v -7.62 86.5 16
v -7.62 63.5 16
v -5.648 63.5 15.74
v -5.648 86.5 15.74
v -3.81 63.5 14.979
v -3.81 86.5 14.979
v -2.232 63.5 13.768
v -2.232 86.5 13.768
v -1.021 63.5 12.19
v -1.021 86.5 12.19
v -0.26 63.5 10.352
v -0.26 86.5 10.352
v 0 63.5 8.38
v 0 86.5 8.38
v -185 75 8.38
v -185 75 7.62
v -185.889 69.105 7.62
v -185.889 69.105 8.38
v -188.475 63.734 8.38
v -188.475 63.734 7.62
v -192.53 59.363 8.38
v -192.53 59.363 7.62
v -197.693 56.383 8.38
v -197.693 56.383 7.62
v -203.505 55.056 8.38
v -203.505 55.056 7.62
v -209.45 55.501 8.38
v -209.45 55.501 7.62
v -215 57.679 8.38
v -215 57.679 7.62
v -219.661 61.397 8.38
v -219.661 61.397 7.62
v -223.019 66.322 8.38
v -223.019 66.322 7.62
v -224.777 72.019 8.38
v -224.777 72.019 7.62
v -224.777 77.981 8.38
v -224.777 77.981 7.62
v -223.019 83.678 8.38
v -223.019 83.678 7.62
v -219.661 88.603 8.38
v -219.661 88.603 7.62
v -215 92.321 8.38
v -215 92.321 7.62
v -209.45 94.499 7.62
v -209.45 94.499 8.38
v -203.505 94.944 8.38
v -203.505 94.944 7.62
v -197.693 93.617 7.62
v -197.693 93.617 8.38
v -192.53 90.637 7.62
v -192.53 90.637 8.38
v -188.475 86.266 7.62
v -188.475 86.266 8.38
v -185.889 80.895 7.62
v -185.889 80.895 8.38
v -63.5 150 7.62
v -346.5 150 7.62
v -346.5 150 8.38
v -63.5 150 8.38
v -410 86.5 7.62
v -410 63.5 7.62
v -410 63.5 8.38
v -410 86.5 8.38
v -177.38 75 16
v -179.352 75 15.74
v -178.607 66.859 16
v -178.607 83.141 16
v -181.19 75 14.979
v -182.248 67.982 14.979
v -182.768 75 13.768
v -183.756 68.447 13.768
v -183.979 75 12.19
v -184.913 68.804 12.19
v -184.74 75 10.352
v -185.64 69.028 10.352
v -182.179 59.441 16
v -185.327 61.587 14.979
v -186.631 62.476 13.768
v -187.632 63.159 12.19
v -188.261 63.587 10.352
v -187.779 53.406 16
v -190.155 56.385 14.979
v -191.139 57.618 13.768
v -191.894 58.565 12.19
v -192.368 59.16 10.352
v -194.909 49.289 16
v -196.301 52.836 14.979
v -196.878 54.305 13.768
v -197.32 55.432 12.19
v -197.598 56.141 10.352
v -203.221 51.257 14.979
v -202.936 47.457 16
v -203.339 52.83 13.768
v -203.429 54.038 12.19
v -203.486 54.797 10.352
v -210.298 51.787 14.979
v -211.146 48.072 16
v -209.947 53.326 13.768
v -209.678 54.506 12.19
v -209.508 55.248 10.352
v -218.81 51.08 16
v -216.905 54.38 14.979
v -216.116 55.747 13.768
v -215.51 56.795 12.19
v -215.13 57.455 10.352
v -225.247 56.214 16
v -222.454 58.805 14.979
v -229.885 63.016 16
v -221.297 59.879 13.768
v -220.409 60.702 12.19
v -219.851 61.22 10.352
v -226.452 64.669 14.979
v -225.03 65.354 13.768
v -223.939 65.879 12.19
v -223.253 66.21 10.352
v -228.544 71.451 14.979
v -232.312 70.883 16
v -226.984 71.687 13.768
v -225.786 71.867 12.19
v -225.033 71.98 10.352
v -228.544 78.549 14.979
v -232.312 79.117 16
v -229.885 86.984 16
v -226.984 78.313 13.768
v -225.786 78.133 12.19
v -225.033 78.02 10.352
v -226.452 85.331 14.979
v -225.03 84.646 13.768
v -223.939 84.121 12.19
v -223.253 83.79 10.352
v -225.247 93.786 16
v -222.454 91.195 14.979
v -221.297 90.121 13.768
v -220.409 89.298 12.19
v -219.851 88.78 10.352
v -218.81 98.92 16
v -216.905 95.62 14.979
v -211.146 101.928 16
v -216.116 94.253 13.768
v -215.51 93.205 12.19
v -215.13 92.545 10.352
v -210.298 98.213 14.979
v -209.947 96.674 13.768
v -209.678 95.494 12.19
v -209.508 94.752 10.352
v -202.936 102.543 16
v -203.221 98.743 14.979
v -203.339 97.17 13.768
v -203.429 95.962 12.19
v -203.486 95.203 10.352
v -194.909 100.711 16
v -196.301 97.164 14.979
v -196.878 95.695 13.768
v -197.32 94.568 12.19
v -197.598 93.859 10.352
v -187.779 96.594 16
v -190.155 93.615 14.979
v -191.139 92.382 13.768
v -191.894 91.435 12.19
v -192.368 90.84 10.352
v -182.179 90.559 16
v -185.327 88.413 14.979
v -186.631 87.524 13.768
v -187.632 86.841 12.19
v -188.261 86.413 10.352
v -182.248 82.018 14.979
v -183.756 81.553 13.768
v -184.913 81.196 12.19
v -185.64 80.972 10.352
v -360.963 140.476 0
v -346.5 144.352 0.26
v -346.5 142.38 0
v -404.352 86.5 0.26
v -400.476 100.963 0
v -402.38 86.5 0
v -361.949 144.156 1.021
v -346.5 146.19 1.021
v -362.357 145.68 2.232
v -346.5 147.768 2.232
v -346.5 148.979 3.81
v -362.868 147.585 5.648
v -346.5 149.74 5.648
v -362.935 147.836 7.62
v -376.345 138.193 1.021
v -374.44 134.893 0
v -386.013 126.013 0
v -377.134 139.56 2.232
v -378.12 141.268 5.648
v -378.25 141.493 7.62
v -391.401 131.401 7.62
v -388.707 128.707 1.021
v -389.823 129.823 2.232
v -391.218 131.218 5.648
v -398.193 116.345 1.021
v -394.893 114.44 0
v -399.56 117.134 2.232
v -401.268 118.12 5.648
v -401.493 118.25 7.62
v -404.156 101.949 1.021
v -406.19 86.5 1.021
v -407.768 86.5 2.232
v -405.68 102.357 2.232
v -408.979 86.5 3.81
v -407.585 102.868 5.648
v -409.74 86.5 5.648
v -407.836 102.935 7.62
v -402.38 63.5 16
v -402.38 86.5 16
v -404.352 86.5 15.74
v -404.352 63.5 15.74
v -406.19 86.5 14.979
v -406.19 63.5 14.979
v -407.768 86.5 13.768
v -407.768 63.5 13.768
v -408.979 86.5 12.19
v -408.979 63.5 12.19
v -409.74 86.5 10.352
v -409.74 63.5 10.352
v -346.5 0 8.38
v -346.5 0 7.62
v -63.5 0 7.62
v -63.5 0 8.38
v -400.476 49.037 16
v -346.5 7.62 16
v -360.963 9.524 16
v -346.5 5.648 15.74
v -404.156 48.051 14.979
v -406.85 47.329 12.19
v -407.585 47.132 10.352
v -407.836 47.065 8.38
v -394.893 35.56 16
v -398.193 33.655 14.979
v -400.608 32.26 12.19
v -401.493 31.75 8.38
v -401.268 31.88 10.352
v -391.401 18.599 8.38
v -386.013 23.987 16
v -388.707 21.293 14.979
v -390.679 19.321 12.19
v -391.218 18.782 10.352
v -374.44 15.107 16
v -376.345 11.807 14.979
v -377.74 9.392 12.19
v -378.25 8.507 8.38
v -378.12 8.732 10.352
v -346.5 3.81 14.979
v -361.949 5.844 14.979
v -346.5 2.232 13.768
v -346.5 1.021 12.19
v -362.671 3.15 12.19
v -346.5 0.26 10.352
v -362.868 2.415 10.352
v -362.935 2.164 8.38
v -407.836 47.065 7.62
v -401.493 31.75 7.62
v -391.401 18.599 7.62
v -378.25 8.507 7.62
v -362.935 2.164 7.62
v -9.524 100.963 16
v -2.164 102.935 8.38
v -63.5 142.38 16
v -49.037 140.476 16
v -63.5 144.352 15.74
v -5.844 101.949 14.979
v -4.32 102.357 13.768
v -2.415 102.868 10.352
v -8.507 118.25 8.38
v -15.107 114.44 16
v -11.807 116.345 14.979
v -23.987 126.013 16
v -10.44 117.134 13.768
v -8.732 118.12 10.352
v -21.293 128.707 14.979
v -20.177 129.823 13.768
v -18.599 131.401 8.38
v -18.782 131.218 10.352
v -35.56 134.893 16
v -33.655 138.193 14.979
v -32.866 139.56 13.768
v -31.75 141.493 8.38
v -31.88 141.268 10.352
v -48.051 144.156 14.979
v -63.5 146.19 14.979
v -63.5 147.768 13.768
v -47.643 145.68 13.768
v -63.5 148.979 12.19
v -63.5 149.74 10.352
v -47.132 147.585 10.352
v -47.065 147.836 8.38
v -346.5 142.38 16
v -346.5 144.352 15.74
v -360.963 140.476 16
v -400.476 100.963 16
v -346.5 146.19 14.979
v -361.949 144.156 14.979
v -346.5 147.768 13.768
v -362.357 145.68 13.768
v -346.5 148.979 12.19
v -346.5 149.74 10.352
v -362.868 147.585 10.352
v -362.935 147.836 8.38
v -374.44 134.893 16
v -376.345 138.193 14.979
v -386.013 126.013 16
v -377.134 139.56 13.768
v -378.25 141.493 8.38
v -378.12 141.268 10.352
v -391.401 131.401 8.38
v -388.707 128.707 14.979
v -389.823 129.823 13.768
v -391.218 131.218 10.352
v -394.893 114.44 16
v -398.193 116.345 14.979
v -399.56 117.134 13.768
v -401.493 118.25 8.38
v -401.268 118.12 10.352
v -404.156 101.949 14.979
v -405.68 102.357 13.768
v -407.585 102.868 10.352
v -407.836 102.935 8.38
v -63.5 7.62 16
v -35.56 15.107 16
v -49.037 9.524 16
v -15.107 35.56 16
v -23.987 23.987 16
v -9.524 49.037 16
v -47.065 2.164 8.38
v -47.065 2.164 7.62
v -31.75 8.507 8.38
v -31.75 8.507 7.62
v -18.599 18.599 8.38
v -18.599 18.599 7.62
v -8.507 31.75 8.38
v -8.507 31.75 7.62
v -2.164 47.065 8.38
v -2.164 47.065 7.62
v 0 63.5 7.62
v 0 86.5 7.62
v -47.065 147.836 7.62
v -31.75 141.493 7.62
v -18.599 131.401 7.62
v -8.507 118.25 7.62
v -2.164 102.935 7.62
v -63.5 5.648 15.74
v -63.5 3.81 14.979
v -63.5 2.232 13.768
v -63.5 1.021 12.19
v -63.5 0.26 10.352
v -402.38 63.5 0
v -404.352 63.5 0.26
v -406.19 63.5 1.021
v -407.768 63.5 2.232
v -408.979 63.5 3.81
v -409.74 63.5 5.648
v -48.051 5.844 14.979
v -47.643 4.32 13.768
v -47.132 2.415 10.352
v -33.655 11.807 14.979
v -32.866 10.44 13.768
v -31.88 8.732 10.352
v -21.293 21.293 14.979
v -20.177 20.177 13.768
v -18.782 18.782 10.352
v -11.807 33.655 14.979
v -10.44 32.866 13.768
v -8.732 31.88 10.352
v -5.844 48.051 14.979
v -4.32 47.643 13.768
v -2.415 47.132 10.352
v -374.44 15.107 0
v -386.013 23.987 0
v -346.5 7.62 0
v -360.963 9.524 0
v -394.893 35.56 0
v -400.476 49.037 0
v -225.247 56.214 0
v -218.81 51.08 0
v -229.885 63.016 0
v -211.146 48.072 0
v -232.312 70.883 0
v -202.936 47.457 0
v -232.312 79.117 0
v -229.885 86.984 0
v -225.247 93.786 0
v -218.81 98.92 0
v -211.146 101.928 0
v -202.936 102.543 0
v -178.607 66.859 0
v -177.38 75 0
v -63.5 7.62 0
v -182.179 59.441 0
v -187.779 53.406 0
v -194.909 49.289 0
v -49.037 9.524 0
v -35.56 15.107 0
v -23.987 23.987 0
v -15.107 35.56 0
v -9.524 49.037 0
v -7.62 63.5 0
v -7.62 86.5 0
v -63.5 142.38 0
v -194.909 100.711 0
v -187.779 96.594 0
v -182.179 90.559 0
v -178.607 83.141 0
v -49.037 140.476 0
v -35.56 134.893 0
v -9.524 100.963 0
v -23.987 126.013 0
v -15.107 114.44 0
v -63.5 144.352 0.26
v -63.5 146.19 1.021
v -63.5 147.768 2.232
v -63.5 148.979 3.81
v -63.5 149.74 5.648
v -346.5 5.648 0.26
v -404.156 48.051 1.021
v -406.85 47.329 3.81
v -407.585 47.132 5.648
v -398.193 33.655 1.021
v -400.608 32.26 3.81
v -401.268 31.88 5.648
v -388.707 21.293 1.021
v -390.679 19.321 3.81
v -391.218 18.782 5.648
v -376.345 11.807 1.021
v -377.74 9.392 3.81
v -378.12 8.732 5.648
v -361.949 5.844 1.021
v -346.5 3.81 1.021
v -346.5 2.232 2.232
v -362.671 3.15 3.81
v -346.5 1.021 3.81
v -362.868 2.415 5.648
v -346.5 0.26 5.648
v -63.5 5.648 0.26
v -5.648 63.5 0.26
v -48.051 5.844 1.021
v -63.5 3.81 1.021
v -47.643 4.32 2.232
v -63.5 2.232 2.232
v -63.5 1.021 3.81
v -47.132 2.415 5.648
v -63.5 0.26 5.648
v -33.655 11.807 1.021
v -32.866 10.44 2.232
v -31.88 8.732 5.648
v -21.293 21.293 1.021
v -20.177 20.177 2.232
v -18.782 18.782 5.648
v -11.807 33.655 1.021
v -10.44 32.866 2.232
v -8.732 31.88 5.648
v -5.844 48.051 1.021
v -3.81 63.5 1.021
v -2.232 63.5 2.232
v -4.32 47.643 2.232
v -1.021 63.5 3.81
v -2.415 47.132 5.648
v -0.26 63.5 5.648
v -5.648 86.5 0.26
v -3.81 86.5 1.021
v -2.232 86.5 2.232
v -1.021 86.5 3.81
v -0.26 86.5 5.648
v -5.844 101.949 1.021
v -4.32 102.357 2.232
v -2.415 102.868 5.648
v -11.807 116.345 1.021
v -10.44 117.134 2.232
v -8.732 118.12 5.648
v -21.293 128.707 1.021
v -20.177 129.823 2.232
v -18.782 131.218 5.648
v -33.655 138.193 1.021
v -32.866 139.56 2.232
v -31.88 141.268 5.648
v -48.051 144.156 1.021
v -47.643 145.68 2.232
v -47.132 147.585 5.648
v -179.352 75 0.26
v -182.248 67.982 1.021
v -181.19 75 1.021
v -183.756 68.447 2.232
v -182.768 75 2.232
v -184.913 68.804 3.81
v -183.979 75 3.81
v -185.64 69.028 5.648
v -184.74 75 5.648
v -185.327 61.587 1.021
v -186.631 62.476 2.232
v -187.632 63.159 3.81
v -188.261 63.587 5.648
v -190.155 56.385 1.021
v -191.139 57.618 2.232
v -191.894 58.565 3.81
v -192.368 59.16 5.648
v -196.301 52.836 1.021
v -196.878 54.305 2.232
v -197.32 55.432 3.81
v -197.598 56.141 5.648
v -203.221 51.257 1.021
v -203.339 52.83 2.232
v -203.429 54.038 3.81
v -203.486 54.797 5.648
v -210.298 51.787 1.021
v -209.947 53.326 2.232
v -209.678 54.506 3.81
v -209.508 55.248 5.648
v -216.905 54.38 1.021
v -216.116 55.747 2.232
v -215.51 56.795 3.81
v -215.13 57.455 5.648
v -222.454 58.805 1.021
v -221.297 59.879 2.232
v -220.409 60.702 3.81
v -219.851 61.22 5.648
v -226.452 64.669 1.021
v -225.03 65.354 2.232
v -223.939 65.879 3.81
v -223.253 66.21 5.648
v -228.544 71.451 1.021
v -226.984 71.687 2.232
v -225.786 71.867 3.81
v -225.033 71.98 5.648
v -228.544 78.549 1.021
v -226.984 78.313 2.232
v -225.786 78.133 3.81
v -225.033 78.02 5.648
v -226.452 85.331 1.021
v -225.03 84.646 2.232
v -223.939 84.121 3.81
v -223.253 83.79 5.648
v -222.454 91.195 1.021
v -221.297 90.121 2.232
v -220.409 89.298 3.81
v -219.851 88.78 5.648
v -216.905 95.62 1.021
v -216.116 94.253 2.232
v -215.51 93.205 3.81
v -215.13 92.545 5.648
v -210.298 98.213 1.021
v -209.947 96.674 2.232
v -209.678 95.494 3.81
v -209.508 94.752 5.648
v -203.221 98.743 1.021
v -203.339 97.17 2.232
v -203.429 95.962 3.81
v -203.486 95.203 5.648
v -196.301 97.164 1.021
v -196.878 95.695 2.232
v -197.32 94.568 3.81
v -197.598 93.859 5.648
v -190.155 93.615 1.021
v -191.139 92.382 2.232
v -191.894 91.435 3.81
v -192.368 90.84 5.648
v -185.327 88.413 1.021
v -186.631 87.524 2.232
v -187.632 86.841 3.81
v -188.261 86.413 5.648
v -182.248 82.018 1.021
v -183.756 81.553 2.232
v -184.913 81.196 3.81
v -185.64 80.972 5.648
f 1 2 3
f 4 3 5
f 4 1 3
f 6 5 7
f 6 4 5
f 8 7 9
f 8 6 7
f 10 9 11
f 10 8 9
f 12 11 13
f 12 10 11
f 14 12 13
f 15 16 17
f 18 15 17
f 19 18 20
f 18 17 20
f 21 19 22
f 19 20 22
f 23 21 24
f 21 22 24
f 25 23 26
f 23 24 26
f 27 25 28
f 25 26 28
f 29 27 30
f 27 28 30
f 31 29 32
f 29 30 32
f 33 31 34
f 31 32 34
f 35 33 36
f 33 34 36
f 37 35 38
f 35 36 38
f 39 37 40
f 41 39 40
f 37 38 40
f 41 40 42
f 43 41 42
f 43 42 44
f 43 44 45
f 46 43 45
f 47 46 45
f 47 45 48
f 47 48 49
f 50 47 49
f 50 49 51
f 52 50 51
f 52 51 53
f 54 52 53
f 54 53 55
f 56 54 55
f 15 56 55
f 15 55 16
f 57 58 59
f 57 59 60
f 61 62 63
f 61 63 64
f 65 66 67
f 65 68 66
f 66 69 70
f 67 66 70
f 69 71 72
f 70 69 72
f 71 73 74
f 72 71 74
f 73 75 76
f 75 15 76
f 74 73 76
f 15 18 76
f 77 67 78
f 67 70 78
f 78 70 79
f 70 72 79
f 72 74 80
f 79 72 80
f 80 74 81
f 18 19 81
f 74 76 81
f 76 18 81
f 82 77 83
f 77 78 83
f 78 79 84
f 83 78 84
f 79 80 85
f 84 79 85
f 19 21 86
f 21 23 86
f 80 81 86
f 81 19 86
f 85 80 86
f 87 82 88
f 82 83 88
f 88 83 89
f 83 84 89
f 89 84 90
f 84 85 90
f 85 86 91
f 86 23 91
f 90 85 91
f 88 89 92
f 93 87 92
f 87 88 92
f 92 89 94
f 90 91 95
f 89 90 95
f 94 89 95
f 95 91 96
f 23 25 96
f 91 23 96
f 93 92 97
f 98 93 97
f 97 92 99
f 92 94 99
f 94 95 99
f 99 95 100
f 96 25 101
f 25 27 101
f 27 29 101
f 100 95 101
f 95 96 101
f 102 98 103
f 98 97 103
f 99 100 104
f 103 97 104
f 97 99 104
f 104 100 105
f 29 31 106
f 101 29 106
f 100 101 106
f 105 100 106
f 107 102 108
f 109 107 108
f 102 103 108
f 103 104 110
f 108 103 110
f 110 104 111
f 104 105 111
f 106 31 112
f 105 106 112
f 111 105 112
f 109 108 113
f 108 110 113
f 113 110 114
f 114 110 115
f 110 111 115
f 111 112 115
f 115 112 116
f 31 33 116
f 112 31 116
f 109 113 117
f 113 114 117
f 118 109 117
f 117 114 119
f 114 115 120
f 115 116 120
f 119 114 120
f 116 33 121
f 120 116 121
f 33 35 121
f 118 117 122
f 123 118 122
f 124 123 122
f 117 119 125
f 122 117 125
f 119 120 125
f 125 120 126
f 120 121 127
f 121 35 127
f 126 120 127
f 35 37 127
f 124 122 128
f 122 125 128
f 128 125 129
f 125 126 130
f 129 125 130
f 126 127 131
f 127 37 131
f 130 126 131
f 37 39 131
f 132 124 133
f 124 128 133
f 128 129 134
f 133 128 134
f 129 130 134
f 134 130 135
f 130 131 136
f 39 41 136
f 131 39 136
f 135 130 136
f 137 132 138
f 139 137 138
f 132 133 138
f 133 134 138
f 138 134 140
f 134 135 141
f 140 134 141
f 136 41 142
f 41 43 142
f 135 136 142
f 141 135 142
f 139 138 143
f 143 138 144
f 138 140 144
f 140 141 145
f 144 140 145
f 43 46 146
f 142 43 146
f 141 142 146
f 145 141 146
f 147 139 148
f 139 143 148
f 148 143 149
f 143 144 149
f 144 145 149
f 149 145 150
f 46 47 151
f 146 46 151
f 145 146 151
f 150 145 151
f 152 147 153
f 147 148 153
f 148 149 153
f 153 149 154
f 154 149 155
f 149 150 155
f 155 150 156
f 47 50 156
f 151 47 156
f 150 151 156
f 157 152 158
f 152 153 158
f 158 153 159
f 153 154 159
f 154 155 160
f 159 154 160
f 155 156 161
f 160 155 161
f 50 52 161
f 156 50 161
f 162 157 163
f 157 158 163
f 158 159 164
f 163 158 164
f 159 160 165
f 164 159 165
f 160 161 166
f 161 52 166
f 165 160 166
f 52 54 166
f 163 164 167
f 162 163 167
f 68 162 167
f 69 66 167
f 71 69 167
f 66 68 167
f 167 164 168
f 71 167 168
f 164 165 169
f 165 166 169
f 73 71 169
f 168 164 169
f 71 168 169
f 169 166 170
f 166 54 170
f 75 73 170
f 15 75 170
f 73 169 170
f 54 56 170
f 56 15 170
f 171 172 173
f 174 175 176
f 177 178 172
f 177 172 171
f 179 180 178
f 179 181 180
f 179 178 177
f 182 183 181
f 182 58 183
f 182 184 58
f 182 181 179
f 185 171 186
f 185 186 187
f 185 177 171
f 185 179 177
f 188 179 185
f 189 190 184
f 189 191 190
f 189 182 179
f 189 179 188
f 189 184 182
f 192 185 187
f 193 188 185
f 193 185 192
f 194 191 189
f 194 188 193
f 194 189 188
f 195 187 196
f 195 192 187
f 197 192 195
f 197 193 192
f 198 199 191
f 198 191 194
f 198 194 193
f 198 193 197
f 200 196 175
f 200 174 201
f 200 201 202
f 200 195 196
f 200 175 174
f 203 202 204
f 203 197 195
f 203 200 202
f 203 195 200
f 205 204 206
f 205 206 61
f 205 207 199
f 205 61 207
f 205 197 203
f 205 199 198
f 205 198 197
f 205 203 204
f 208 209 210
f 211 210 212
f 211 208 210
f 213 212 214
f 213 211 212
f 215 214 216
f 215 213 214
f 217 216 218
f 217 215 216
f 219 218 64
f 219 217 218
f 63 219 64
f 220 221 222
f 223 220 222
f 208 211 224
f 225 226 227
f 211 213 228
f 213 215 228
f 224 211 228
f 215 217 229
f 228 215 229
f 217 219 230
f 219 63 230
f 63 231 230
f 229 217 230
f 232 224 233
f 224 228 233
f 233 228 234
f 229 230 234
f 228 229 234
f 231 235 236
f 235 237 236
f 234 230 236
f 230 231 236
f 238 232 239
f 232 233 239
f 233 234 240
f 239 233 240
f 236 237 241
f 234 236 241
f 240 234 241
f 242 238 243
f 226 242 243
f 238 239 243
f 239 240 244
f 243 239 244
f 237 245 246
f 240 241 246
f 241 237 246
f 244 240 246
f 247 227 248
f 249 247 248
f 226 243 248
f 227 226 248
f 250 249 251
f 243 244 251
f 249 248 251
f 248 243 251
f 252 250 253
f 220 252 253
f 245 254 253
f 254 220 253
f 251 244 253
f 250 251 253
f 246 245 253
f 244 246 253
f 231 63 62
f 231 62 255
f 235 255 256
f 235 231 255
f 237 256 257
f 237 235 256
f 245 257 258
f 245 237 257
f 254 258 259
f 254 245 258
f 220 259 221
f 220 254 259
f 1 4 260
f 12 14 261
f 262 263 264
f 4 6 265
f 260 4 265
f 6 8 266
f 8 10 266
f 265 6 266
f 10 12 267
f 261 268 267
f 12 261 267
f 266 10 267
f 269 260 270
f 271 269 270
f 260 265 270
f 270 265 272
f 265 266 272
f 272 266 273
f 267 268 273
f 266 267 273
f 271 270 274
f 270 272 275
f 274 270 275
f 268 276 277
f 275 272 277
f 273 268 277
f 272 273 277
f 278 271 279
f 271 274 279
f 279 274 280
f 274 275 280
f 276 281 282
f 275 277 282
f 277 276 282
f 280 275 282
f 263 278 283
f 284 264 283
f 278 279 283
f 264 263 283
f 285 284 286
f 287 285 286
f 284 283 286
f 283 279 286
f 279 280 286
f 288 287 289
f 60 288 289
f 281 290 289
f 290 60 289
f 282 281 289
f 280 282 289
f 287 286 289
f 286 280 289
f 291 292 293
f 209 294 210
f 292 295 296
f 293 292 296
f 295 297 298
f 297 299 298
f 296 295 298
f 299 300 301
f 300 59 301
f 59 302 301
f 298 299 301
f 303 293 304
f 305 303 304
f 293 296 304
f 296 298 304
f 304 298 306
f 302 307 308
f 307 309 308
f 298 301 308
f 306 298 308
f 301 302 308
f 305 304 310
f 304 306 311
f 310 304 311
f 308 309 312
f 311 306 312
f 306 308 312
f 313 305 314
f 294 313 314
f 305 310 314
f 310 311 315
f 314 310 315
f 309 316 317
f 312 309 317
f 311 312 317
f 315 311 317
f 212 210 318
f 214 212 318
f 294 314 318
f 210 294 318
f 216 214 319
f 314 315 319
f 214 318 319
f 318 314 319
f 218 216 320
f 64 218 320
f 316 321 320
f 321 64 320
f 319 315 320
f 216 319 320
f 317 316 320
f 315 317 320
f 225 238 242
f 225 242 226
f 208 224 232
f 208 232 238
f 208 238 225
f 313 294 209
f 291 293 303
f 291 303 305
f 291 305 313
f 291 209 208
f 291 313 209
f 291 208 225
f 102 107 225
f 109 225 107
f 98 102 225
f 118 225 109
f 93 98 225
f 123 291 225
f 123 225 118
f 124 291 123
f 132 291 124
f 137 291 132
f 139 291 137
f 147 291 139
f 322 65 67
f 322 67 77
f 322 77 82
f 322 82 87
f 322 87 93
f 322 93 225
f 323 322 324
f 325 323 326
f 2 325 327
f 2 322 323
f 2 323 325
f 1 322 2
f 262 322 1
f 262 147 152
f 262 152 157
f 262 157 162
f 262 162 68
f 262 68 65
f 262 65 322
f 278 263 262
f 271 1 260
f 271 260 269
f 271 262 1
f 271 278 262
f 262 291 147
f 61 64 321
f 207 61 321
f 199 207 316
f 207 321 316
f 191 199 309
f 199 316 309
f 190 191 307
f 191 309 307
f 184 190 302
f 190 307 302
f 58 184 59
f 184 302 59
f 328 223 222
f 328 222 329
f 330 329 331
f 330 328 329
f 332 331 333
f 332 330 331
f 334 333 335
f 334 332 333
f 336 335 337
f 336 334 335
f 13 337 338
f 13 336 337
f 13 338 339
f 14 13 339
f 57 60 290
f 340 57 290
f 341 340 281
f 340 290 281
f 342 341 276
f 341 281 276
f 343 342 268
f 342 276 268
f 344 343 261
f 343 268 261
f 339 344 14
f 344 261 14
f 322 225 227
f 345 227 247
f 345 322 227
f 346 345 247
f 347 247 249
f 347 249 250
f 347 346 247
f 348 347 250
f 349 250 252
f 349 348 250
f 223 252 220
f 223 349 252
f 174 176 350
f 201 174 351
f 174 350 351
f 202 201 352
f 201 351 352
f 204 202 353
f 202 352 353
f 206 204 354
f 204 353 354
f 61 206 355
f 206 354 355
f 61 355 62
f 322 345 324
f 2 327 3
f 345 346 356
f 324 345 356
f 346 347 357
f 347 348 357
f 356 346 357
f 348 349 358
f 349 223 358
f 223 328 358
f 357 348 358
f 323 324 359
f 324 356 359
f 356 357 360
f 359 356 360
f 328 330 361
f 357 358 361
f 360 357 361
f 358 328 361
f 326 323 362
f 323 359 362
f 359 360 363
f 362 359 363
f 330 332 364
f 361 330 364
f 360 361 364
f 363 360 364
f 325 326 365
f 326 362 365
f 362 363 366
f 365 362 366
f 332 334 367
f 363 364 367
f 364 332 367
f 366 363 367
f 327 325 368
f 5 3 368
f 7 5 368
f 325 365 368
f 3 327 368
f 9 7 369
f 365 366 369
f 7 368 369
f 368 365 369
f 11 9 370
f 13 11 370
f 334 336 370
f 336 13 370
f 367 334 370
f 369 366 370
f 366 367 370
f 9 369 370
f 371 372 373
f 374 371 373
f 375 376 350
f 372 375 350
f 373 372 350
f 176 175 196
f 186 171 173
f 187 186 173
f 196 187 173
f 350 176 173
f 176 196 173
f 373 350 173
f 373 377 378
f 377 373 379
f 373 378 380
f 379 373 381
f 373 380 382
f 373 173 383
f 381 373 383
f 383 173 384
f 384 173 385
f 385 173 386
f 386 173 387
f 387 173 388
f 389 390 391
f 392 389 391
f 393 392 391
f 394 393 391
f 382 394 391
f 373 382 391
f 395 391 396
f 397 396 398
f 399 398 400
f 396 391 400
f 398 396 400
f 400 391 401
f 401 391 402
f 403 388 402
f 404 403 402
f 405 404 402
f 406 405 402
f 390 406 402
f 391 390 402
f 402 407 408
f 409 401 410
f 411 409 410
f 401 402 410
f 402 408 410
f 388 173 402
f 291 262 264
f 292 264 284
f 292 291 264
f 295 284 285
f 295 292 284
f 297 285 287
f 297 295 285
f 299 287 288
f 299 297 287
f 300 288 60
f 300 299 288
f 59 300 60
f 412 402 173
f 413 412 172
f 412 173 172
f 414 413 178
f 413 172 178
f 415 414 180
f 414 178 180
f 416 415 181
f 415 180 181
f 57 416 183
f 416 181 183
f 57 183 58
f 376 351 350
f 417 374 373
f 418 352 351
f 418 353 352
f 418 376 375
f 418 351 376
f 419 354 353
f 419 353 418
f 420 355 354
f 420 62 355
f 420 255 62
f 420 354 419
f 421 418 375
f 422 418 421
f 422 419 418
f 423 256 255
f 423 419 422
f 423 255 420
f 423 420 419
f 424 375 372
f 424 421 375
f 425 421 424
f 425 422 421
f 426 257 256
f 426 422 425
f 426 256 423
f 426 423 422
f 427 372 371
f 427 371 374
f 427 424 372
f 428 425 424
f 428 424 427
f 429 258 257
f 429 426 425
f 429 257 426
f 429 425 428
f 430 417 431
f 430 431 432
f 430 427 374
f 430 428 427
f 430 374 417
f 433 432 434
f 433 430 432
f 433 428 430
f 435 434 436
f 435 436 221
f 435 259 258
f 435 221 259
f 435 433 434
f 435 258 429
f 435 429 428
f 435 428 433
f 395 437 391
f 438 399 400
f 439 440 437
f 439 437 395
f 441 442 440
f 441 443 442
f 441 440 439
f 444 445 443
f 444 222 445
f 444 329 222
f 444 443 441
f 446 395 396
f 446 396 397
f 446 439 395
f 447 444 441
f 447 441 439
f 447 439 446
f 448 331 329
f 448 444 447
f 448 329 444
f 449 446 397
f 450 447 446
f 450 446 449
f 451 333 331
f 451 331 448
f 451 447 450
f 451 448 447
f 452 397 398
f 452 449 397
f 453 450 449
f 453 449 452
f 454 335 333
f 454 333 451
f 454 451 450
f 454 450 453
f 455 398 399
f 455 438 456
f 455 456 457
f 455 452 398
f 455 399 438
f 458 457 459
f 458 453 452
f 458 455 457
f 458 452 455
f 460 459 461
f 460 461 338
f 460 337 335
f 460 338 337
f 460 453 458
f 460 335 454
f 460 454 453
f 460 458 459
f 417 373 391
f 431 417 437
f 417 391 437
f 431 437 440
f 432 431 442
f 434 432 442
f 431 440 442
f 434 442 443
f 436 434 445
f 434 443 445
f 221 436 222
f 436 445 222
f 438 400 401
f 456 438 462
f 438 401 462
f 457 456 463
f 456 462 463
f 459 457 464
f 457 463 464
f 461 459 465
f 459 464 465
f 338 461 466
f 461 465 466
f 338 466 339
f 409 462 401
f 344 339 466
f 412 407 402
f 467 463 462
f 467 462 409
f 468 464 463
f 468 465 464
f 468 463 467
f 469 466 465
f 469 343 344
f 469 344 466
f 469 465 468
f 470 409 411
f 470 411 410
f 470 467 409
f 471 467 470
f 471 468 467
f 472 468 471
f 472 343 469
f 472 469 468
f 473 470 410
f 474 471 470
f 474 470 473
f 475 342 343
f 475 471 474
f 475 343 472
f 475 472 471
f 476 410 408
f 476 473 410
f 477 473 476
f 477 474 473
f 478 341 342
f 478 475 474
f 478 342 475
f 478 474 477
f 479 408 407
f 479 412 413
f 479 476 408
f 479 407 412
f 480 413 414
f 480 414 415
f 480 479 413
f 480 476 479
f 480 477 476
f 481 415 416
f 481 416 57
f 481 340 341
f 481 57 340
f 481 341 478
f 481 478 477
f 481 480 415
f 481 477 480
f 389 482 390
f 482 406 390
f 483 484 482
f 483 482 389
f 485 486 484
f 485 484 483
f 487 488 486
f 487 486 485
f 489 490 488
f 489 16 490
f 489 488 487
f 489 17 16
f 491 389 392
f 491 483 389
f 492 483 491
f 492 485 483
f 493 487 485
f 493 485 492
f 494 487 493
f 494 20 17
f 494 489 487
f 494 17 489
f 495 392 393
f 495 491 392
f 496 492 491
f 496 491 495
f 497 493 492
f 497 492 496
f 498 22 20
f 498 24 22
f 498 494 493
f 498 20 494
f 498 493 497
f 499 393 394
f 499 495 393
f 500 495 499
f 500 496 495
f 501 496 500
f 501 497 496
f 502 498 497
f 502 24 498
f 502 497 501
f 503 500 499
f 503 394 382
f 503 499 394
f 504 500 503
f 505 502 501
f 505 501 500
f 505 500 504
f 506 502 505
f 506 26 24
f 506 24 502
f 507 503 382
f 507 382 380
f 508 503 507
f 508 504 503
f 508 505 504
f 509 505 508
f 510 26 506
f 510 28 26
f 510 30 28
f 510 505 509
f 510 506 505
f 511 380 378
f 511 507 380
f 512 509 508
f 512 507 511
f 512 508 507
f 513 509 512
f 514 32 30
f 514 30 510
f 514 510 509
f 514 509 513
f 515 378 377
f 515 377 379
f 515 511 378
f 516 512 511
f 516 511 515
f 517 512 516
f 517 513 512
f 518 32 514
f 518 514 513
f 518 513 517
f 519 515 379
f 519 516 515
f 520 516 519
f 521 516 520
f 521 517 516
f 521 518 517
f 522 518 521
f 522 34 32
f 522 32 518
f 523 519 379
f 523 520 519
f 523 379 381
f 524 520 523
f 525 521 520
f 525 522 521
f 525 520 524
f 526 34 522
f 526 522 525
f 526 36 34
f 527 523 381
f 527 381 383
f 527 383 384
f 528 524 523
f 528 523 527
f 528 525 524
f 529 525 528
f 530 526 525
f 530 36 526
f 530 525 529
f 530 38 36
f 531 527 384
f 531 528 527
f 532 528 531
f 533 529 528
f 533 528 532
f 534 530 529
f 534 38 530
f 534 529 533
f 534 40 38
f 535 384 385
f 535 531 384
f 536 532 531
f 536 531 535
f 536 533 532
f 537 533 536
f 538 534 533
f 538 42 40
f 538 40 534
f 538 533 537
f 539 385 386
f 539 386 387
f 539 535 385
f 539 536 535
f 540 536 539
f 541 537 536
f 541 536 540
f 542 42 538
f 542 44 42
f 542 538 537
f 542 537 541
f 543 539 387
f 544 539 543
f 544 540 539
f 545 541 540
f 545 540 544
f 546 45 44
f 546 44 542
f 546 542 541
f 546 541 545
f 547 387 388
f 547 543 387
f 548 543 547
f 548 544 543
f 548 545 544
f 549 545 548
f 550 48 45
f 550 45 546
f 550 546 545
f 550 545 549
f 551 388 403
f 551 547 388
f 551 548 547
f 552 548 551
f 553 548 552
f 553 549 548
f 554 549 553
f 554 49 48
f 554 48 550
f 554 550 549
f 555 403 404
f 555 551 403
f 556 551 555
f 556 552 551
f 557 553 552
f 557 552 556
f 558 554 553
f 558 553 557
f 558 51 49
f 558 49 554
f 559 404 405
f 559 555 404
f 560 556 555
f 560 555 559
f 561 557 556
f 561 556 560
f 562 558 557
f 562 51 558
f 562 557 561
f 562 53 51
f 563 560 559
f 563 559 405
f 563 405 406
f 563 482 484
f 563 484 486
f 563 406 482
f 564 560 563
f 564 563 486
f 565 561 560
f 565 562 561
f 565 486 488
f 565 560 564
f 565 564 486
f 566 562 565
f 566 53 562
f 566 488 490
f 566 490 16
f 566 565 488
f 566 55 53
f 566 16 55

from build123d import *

# Parameters (mm, degrees)
F0_W     = 410
F0_H     = 150
F1_DEPTH = 16
F2_R     = 20
F3_DEPTH = 16.001
F4_R     = 63.5
F5_R     = 7.62


# Not quite as in the source:
# - a feature names something its author has since deleted; it is built from what else it names


with BuildPart() as f1:
    # F0 (on Top) → F1 (new body)
    with BuildSketch(Plane.XY):
        with Locations((-205, 75)):
            Rectangle(F0_W, F0_H)
    extrude(amount=F1_DEPTH)

    # F2 (on face) → F3 (cut, through all)
    with BuildSketch(Plane(origin=(0, 0, 0), x_dir=(1, 0, 0), z_dir=(0, 0, -1))):
        with Locations((-205, -75)):
            Circle(F2_R)
    extrude(amount=-F3_DEPTH, mode=Mode.SUBTRACT)

    # F4
    f4_edges = [f1.edges().sort_by_distance(p)[0] for p in [
        (-410, 150, 8),
        (-410, 0, 8),
        (0, 0, 8),
        (0, 150, 8),
    ]]
    fillet(f4_edges, radius=F4_R)

    # F5
    f5_edges = [f1.edges().sort_by_distance(p)[0] for p in [
        (-205, 0, 0),
        (-205, 0, 16),
        (-225, 75, 16),
        (-391.401281, 18.598719, 0),
        (-18.598719, 18.598719, 0),
        (-410, 75, 0),
        (0, 75, 0),
        (-391.401281, 131.401281, 0),
        (-18.598719, 131.401281, 0),
        (-205, 150, 0),
        (-225, 75, 0),
    ]]
    fillet(f5_edges, radius=F5_R)


solid = f1.part
